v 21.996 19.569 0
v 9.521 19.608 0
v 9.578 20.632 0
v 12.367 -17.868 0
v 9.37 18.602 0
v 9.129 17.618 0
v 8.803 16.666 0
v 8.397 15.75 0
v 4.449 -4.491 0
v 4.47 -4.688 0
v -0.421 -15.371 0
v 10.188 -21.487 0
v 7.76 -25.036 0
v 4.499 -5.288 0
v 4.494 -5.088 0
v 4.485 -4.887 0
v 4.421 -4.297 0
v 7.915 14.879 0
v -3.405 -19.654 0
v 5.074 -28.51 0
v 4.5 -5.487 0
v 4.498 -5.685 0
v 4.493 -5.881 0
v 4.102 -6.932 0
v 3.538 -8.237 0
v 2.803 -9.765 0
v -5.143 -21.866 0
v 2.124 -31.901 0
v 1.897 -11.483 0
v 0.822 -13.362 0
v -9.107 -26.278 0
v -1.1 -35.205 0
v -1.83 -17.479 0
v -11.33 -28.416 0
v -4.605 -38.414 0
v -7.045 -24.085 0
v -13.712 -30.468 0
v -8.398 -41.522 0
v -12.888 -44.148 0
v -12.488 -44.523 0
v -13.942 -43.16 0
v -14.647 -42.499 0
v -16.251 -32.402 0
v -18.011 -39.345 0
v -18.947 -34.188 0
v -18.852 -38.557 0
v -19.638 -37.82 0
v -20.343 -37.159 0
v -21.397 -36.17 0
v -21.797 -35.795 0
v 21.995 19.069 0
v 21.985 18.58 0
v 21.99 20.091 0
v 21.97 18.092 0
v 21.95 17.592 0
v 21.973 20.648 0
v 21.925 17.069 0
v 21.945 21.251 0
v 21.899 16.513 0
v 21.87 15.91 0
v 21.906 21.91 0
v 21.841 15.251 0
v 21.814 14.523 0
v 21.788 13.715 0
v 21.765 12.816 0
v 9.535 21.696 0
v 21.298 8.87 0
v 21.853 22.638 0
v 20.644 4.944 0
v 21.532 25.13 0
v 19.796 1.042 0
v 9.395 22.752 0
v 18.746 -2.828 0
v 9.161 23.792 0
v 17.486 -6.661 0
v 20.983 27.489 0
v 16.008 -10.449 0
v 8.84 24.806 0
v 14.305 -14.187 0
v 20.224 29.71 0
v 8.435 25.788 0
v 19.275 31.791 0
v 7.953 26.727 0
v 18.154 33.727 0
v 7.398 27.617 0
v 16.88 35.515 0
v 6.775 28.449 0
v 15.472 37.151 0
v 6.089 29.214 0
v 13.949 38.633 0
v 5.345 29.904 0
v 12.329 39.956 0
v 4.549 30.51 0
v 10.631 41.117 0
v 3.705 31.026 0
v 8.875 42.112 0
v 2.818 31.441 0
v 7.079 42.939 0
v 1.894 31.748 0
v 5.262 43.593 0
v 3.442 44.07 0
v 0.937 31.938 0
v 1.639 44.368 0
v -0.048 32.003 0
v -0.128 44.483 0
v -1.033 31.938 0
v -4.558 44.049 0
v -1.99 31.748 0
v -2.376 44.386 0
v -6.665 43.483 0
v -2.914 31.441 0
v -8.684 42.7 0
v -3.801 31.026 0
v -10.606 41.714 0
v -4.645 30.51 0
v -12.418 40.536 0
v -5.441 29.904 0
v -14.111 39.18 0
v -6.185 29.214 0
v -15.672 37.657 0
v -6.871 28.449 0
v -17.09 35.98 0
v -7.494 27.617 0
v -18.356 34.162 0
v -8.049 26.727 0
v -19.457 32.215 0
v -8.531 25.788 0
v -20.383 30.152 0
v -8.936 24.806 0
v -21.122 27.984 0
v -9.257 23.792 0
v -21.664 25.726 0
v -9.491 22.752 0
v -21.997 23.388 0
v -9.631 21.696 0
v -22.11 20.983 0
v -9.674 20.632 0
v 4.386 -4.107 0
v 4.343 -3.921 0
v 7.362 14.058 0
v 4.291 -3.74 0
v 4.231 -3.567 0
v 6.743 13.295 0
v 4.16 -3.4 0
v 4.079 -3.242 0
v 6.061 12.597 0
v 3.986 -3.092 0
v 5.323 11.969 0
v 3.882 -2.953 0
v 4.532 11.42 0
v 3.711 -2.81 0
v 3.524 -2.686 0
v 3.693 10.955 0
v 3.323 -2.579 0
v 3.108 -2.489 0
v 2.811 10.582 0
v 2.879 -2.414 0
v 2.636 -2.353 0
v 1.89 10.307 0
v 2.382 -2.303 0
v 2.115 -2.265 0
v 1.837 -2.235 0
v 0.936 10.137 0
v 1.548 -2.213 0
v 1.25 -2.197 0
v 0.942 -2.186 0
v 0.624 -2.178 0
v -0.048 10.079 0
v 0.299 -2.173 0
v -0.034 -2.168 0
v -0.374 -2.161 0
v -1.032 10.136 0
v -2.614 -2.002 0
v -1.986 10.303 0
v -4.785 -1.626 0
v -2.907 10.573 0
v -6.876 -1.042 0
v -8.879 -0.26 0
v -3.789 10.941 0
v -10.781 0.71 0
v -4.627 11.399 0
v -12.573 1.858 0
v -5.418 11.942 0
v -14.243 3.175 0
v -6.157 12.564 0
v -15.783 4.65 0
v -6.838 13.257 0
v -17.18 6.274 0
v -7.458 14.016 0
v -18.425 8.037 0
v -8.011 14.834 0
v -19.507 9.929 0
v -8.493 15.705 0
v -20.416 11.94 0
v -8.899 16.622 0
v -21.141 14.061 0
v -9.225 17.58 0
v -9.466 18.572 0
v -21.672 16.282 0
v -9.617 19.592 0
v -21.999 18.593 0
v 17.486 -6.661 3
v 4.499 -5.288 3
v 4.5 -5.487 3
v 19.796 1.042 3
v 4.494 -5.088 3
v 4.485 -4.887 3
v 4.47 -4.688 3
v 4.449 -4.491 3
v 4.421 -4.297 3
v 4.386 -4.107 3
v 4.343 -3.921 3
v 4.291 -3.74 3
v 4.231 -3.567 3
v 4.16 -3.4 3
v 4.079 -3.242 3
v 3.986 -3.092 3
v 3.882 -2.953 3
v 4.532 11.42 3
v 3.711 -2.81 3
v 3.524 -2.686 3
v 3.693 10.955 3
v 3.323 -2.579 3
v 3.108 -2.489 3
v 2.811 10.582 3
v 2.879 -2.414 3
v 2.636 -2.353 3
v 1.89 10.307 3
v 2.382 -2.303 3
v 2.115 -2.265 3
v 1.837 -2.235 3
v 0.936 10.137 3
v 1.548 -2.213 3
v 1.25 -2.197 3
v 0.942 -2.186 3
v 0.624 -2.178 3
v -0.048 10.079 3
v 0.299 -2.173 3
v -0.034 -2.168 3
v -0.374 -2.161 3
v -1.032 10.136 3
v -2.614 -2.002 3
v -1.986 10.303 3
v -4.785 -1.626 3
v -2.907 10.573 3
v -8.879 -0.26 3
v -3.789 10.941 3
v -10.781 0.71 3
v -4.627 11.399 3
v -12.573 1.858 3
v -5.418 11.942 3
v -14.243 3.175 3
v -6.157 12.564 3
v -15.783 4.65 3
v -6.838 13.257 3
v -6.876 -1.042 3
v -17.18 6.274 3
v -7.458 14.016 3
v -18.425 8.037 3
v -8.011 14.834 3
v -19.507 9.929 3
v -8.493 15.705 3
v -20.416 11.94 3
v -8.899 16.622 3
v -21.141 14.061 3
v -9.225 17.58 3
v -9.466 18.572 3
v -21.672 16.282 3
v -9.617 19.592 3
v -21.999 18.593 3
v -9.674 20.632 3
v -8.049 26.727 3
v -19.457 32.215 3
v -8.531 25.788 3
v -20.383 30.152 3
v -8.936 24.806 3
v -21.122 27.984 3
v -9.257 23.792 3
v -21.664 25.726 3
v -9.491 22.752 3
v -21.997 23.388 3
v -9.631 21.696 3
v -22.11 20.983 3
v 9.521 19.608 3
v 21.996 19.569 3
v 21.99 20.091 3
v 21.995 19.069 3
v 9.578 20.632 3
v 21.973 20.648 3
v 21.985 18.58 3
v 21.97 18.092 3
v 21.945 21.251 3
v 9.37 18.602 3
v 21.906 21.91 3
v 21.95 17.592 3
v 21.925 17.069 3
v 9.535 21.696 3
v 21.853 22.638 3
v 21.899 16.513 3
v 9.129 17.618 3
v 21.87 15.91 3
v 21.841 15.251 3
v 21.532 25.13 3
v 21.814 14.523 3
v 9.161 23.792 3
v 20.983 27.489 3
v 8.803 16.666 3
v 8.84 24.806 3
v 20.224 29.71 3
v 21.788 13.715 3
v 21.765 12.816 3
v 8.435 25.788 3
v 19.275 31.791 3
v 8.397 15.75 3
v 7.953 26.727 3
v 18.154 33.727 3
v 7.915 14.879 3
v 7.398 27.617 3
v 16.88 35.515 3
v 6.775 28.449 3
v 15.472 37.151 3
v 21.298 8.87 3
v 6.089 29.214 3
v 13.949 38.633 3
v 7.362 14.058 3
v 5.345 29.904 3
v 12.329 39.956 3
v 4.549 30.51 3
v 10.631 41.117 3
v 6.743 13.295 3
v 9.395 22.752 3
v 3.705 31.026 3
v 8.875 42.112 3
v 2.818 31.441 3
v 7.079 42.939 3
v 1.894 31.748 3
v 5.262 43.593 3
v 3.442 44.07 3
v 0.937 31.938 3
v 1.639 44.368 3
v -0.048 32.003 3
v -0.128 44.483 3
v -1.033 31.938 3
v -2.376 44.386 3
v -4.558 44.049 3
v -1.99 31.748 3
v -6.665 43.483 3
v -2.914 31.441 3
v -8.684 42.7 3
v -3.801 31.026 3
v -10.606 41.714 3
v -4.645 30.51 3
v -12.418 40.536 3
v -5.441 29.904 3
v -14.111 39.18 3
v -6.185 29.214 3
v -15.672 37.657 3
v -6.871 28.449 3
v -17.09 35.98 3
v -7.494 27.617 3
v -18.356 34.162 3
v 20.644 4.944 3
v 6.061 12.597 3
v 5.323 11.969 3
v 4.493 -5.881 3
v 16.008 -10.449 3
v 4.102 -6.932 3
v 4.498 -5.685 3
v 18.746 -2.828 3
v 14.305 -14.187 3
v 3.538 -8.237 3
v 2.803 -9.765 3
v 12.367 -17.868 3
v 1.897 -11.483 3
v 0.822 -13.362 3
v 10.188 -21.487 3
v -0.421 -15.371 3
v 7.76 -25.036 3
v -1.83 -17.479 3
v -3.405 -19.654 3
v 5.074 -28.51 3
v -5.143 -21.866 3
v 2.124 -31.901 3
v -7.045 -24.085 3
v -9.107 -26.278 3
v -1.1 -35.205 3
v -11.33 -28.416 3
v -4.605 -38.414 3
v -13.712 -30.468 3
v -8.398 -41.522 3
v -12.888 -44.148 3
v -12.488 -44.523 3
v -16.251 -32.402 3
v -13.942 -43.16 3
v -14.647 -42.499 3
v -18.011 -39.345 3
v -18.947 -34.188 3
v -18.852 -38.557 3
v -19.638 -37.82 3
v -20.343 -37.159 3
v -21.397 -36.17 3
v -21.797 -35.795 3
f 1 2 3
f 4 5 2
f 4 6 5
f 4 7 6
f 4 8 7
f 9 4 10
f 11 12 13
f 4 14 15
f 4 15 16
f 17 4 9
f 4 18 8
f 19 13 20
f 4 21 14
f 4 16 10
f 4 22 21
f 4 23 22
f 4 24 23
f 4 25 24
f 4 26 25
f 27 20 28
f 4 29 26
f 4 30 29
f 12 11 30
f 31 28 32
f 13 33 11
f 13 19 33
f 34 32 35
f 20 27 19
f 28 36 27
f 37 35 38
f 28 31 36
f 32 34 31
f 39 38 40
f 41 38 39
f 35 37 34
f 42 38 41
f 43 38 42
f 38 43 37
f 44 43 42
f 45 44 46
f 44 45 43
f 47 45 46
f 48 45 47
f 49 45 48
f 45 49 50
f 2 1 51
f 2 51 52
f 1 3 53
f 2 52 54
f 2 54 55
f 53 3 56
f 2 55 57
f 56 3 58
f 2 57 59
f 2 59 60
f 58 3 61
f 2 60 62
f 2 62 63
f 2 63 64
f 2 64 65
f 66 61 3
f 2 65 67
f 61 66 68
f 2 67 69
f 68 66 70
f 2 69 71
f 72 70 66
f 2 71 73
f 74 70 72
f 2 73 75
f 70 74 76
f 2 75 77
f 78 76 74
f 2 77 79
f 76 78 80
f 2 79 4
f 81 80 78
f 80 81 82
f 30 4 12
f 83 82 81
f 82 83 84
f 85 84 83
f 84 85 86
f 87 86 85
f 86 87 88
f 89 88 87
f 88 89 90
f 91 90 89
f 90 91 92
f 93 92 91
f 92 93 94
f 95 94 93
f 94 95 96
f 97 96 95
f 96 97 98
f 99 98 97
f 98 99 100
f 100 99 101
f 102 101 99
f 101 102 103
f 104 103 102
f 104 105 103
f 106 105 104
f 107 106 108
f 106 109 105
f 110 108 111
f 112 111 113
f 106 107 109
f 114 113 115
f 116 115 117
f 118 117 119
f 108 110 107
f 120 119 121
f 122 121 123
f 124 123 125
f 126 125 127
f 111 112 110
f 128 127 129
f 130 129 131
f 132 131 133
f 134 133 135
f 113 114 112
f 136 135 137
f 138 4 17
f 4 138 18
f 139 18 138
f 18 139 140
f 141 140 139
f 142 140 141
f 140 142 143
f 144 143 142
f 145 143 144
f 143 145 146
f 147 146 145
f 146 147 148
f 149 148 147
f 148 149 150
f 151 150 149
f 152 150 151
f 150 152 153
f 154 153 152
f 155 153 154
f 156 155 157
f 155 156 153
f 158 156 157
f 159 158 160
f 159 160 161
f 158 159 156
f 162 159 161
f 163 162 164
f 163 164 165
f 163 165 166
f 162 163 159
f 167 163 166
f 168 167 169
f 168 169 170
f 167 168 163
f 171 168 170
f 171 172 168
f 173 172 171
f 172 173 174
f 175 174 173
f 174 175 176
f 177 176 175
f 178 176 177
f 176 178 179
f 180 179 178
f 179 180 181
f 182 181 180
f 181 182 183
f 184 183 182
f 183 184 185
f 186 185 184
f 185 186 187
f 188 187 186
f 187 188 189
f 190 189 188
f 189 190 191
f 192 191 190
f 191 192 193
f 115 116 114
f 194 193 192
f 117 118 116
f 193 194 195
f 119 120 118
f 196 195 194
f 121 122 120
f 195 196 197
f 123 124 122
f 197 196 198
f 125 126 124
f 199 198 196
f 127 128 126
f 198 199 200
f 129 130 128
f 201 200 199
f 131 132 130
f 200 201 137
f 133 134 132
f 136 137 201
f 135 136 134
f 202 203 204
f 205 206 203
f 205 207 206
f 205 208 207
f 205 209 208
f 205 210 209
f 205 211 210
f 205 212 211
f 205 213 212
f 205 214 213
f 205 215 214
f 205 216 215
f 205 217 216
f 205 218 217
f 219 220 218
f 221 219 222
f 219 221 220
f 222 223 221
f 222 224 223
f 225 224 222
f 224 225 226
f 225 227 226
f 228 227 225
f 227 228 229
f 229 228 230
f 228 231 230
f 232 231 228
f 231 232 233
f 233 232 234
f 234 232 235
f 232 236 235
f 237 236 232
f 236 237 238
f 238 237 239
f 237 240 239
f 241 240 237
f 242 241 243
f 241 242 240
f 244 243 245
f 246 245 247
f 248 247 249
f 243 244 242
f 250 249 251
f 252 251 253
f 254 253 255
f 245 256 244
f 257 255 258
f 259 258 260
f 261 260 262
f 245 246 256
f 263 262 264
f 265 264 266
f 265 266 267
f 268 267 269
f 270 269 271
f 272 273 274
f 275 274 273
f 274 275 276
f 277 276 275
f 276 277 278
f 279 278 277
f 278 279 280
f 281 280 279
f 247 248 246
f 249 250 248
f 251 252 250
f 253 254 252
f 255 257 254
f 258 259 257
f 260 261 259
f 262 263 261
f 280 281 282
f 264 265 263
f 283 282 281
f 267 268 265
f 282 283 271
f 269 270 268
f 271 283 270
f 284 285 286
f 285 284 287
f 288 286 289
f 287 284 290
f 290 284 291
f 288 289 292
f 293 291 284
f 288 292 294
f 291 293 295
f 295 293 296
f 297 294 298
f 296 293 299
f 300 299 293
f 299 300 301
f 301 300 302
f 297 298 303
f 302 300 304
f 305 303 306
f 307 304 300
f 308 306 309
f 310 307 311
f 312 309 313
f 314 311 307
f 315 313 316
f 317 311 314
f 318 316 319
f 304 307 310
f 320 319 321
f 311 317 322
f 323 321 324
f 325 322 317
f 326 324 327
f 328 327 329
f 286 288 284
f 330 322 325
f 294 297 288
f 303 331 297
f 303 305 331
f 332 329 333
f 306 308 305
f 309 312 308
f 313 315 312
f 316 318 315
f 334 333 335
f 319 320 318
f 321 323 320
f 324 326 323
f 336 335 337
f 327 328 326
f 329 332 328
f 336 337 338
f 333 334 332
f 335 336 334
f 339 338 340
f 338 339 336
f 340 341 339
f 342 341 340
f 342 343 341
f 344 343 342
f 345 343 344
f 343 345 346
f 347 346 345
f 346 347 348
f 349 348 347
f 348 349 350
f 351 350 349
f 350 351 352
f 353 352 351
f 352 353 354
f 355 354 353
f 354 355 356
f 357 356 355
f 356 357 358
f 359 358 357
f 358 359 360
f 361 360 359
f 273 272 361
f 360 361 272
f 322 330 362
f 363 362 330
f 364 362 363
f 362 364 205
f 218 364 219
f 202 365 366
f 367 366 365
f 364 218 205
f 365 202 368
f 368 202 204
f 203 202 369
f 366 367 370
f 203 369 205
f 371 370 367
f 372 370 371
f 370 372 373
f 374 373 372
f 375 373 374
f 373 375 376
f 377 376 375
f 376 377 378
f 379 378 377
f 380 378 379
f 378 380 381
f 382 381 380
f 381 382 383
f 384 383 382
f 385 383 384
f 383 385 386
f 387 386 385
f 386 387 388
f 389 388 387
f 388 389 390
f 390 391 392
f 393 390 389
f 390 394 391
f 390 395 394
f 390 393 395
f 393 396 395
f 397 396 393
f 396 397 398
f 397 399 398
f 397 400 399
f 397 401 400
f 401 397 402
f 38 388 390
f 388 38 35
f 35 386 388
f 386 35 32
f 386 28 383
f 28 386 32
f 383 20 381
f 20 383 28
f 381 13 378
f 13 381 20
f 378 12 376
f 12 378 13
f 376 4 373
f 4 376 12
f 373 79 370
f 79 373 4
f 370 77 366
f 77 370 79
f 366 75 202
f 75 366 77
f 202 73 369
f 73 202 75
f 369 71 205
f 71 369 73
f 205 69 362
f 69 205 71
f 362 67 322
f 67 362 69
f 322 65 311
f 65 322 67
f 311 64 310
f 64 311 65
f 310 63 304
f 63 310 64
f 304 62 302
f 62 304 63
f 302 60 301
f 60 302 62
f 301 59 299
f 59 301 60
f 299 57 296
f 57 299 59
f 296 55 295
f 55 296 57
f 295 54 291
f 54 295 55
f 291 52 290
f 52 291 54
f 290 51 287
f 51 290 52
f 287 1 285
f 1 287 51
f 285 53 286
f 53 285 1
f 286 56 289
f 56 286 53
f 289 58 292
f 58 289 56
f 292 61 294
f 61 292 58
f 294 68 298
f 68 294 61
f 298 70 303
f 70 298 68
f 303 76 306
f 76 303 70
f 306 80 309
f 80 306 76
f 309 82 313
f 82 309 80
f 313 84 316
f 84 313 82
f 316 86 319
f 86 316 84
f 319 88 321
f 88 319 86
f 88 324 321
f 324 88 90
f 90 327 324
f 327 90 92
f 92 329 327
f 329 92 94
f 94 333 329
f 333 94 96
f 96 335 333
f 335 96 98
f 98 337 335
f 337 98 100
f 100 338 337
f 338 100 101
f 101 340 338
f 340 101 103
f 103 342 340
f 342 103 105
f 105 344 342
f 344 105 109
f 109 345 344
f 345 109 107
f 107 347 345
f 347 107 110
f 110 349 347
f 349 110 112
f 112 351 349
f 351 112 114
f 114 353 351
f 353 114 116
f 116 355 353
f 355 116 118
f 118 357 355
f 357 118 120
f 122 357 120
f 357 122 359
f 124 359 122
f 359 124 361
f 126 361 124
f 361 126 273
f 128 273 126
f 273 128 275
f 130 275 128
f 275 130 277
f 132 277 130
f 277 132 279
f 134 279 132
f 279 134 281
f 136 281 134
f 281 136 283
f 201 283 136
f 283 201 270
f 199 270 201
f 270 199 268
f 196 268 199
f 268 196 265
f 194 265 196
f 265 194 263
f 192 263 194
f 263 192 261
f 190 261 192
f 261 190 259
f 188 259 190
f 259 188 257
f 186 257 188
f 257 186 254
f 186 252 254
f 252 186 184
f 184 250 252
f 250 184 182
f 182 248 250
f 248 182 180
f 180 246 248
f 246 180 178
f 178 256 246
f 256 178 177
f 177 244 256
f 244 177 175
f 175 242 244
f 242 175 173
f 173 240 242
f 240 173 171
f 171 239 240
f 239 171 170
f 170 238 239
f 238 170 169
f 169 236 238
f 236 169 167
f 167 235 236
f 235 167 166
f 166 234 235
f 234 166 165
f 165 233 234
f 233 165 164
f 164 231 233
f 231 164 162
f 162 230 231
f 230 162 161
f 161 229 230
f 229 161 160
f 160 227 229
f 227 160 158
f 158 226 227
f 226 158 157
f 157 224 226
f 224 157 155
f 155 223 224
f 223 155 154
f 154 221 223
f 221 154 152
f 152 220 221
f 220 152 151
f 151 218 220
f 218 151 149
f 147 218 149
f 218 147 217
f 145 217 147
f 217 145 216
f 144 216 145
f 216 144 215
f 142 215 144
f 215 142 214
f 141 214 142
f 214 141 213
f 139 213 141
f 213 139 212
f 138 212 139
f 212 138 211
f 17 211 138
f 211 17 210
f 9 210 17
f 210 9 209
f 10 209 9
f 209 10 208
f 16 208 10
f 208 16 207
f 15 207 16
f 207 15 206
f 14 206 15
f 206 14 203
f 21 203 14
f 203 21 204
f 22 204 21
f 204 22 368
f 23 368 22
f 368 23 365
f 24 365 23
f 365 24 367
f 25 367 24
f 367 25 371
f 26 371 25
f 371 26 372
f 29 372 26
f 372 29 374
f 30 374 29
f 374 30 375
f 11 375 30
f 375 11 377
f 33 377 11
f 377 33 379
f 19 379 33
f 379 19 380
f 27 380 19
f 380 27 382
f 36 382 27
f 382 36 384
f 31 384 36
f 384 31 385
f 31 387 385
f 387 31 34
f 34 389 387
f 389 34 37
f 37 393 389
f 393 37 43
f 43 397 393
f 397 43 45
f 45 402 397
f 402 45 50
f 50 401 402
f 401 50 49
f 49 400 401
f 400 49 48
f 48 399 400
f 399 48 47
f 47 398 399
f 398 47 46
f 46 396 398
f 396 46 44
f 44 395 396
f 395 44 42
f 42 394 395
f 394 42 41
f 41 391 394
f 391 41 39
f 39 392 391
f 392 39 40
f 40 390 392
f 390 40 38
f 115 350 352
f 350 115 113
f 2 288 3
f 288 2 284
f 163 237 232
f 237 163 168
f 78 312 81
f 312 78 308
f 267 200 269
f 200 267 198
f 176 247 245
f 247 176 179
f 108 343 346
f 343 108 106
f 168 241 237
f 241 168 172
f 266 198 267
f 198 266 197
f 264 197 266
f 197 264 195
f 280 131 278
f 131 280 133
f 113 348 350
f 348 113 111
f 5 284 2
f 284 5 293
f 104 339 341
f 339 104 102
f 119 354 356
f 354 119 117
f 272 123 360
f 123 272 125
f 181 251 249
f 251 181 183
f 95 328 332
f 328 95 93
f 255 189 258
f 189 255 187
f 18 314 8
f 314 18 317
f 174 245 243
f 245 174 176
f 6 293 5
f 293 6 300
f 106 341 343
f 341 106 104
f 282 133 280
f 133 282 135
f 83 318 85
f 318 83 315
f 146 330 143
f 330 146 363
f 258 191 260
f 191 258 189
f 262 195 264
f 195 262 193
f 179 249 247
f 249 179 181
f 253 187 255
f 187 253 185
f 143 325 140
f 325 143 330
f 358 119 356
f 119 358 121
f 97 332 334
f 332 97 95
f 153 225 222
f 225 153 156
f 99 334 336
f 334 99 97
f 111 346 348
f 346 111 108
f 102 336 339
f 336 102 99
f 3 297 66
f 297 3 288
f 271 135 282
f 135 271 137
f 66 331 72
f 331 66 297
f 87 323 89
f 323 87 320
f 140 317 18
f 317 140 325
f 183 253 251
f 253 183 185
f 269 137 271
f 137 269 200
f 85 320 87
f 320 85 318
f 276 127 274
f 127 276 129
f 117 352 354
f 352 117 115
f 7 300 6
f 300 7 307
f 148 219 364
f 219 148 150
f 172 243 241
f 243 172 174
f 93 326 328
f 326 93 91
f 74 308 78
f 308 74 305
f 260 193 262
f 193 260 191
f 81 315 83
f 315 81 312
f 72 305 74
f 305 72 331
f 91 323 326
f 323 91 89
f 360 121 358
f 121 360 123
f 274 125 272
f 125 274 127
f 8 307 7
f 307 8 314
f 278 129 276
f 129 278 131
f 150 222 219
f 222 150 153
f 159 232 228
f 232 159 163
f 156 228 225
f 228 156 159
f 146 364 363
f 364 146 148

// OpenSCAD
// Generated from 交通部公路局（原交通部公路總局）「新式號牌使用之英文字、數字字體」author trace
fudge = 0.1;

module glyph_2012_9(h = 3) {
  difference() {
    linear_extrude(height = h)
      polygon(points = [[21.7654, 12.816], [21.7879, 13.715], [21.8137, 14.5228], [21.8415, 15.2507], [21.8702, 15.9102], [21.8986, 16.5126], [21.9255, 17.0695], [21.9497, 17.5922], [21.9701, 18.092], [21.9855, 18.5805], [21.9946, 19.0689], [21.9964, 19.5688], [21.9896, 20.0914], [21.973, 20.6483], [21.9455, 21.2508], [21.9059, 21.9102], [21.8529, 22.6382], [21.5322, 25.1305], [20.9831, 27.4891], [20.2245, 29.7103], [19.2753, 31.7907], [18.1543, 33.7266], [16.8803, 35.5147], [15.4722, 37.1513], [13.9487, 38.6329], [12.3289, 39.956], [10.6314, 41.117], [8.8751, 42.1125], [7.0789, 42.9388], [5.2616, 43.5926], [3.442, 44.0701], [1.639, 44.368], [-0.1285, 44.4827], [-2.3759, 44.3865], [-4.5583, 44.049], [-6.6648, 43.4828], [-8.6844, 42.7003], [-10.6059, 41.714], [-12.4183, 40.5363], [-14.1106, 39.1799], [-15.6717, 37.6571], [-17.0905, 35.9804], [-18.3559, 34.1623], [-19.457, 32.2153], [-20.3827, 30.1519], [-21.1219, 27.9845], [-21.6636, 25.7257], [-21.9966, 23.3879], [-22.11, 20.9835], [-21.9988, 18.5926], [-21.6725, 16.2819], [-21.1415, 14.0612], [-20.4163, 11.9402], [-19.5073, 9.9288], [-18.4251, 8.0367], [-17.1801, 6.2738], [-15.7826, 4.65], [-14.2433, 3.1749], [-12.5726, 1.8584], [-10.7809, 0.7102], [-8.8787, -0.2597], [-6.8765, -1.0416], [-4.7846, -1.6257], [-2.6137, -2.0023], [-0.3741, -2.1614], [-0.034, -2.1676], [0.2991, -2.1727], [0.6245, -2.1784], [0.9416, -2.186], [1.2498, -2.197], [1.5485, -2.2128], [1.8371, -2.2348], [2.1151, -2.2646], [2.3817, -2.3034], [2.6365, -2.3529], [2.8787, -2.4144], [3.1079, -2.4894], [3.3234, -2.5793], [3.5245, -2.6856], [3.7108, -2.8097], [3.8816, -2.9531], [3.986, -3.0924], [4.0786, -3.2416], [4.16, -3.4], [4.2307, -3.5666], [4.2915, -3.7405], [4.3431, -3.9208], [4.386, -4.1066], [4.421, -4.2971], [4.4486, -4.4914], [4.4696, -4.6884], [4.4846, -4.8875], [4.4942, -5.0876], [4.4992, -5.2878], [4.5002, -5.4874], [4.4977, -5.6853], [4.4926, -5.8807], [4.1019, -6.9325], [3.5383, -8.2375], [2.8029, -9.7647], [1.8971, -11.4833], [0.8221, -13.3624], [-0.4207, -15.3711], [-1.8301, -17.4786], [-3.4047, -19.6539], [-5.1433, -21.8662], [-7.0447, -24.0847], [-9.1074, -26.2784], [-11.3303, -28.4165], [-13.712, -30.4681], [-16.2512, -32.4023], [-18.9467, -34.1883], [-21.7971, -35.7952], [-21.6926, -35.8932], [-21.3971, -36.1702], [-20.938, -36.6007], [-20.3426, -37.159], [-19.638, -37.8196], [-18.8516, -38.5568], [-18.0107, -39.3453], [-17.1425, -40.1593], [-16.2743, -40.9733], [-15.4334, -41.7617], [-14.647, -42.499], [-13.9425, -43.1596], [-13.347, -43.7179], [-12.8879, -44.1483], [-12.5925, -44.4253], [-12.4879, -44.5234], [-8.3979, -41.5222], [-4.6046, -38.414], [-1.1, -35.205], [2.1237, -31.9014], [5.0744, -28.5097], [7.7599, -25.0361], [10.1883, -21.487], [12.3672, -17.8685], [14.3046, -14.1871], [16.0083, -10.449], [17.4863, -6.6606], [18.7464, -2.8282], [19.7965, 1.042], [20.6444, 4.9437], [21.2981, 8.8704]]);
    translate([0, 0, -fudge])
      linear_extrude(height = h + 2 * fudge)
        polygon(points = [[-0.048, 10.0787], [-1.0317, 10.1358], [-1.9861, 10.3027], [-2.9067, 10.5731], [-3.7886, 10.9408], [-4.6274, 11.3993], [-5.4184, 11.9424], [-6.1568, 12.5638], [-6.8381, 13.257], [-7.4576, 14.0158], [-8.0107, 14.8339], [-8.4927, 15.7049], [-8.8989, 16.6225], [-9.2248, 17.5804], [-9.4657, 18.5722], [-9.6169, 19.5916], [-9.6737, 20.6323], [-9.6313, 21.6965], [-9.4909, 22.7525], [-9.2574, 23.792], [-8.9359, 24.8065], [-8.5315, 25.7878], [-8.0492, 26.7275], [-7.494, 27.6173], [-6.871, 28.4489], [-6.1851, 29.2138], [-5.4415, 29.9038], [-4.6451, 30.5105], [-3.801, 31.0257], [-2.9142, 31.4408], [-1.9897, 31.7477], [-1.0327, 31.9379], [-0.048, 32.0032], [0.9367, 31.9379], [1.8937, 31.7477], [2.8181, 31.4408], [3.7049, 31.0257], [4.549, 30.5105], [5.3453, 29.9038], [6.089, 29.2138], [6.7748, 28.4489], [7.3978, 27.6173], [7.953, 26.7275], [8.4353, 25.7878], [8.8397, 24.8065], [9.1612, 23.792], [9.3947, 22.7525], [9.5352, 21.6965], [9.5777, 20.6323], [9.5211, 19.6085], [9.3701, 18.6017], [9.1294, 17.6185], [8.8035, 16.6658], [8.3973, 15.7504], [7.9153, 14.8791], [7.3622, 14.0585], [6.7426, 13.2955], [6.0613, 12.597], [5.3228, 11.9695], [4.5317, 11.42], [3.6929, 10.9552], [2.8108, 10.5819], [1.8902, 10.3069], [0.9357, 10.1369]]);
  }
}

glyph_2012_9();
